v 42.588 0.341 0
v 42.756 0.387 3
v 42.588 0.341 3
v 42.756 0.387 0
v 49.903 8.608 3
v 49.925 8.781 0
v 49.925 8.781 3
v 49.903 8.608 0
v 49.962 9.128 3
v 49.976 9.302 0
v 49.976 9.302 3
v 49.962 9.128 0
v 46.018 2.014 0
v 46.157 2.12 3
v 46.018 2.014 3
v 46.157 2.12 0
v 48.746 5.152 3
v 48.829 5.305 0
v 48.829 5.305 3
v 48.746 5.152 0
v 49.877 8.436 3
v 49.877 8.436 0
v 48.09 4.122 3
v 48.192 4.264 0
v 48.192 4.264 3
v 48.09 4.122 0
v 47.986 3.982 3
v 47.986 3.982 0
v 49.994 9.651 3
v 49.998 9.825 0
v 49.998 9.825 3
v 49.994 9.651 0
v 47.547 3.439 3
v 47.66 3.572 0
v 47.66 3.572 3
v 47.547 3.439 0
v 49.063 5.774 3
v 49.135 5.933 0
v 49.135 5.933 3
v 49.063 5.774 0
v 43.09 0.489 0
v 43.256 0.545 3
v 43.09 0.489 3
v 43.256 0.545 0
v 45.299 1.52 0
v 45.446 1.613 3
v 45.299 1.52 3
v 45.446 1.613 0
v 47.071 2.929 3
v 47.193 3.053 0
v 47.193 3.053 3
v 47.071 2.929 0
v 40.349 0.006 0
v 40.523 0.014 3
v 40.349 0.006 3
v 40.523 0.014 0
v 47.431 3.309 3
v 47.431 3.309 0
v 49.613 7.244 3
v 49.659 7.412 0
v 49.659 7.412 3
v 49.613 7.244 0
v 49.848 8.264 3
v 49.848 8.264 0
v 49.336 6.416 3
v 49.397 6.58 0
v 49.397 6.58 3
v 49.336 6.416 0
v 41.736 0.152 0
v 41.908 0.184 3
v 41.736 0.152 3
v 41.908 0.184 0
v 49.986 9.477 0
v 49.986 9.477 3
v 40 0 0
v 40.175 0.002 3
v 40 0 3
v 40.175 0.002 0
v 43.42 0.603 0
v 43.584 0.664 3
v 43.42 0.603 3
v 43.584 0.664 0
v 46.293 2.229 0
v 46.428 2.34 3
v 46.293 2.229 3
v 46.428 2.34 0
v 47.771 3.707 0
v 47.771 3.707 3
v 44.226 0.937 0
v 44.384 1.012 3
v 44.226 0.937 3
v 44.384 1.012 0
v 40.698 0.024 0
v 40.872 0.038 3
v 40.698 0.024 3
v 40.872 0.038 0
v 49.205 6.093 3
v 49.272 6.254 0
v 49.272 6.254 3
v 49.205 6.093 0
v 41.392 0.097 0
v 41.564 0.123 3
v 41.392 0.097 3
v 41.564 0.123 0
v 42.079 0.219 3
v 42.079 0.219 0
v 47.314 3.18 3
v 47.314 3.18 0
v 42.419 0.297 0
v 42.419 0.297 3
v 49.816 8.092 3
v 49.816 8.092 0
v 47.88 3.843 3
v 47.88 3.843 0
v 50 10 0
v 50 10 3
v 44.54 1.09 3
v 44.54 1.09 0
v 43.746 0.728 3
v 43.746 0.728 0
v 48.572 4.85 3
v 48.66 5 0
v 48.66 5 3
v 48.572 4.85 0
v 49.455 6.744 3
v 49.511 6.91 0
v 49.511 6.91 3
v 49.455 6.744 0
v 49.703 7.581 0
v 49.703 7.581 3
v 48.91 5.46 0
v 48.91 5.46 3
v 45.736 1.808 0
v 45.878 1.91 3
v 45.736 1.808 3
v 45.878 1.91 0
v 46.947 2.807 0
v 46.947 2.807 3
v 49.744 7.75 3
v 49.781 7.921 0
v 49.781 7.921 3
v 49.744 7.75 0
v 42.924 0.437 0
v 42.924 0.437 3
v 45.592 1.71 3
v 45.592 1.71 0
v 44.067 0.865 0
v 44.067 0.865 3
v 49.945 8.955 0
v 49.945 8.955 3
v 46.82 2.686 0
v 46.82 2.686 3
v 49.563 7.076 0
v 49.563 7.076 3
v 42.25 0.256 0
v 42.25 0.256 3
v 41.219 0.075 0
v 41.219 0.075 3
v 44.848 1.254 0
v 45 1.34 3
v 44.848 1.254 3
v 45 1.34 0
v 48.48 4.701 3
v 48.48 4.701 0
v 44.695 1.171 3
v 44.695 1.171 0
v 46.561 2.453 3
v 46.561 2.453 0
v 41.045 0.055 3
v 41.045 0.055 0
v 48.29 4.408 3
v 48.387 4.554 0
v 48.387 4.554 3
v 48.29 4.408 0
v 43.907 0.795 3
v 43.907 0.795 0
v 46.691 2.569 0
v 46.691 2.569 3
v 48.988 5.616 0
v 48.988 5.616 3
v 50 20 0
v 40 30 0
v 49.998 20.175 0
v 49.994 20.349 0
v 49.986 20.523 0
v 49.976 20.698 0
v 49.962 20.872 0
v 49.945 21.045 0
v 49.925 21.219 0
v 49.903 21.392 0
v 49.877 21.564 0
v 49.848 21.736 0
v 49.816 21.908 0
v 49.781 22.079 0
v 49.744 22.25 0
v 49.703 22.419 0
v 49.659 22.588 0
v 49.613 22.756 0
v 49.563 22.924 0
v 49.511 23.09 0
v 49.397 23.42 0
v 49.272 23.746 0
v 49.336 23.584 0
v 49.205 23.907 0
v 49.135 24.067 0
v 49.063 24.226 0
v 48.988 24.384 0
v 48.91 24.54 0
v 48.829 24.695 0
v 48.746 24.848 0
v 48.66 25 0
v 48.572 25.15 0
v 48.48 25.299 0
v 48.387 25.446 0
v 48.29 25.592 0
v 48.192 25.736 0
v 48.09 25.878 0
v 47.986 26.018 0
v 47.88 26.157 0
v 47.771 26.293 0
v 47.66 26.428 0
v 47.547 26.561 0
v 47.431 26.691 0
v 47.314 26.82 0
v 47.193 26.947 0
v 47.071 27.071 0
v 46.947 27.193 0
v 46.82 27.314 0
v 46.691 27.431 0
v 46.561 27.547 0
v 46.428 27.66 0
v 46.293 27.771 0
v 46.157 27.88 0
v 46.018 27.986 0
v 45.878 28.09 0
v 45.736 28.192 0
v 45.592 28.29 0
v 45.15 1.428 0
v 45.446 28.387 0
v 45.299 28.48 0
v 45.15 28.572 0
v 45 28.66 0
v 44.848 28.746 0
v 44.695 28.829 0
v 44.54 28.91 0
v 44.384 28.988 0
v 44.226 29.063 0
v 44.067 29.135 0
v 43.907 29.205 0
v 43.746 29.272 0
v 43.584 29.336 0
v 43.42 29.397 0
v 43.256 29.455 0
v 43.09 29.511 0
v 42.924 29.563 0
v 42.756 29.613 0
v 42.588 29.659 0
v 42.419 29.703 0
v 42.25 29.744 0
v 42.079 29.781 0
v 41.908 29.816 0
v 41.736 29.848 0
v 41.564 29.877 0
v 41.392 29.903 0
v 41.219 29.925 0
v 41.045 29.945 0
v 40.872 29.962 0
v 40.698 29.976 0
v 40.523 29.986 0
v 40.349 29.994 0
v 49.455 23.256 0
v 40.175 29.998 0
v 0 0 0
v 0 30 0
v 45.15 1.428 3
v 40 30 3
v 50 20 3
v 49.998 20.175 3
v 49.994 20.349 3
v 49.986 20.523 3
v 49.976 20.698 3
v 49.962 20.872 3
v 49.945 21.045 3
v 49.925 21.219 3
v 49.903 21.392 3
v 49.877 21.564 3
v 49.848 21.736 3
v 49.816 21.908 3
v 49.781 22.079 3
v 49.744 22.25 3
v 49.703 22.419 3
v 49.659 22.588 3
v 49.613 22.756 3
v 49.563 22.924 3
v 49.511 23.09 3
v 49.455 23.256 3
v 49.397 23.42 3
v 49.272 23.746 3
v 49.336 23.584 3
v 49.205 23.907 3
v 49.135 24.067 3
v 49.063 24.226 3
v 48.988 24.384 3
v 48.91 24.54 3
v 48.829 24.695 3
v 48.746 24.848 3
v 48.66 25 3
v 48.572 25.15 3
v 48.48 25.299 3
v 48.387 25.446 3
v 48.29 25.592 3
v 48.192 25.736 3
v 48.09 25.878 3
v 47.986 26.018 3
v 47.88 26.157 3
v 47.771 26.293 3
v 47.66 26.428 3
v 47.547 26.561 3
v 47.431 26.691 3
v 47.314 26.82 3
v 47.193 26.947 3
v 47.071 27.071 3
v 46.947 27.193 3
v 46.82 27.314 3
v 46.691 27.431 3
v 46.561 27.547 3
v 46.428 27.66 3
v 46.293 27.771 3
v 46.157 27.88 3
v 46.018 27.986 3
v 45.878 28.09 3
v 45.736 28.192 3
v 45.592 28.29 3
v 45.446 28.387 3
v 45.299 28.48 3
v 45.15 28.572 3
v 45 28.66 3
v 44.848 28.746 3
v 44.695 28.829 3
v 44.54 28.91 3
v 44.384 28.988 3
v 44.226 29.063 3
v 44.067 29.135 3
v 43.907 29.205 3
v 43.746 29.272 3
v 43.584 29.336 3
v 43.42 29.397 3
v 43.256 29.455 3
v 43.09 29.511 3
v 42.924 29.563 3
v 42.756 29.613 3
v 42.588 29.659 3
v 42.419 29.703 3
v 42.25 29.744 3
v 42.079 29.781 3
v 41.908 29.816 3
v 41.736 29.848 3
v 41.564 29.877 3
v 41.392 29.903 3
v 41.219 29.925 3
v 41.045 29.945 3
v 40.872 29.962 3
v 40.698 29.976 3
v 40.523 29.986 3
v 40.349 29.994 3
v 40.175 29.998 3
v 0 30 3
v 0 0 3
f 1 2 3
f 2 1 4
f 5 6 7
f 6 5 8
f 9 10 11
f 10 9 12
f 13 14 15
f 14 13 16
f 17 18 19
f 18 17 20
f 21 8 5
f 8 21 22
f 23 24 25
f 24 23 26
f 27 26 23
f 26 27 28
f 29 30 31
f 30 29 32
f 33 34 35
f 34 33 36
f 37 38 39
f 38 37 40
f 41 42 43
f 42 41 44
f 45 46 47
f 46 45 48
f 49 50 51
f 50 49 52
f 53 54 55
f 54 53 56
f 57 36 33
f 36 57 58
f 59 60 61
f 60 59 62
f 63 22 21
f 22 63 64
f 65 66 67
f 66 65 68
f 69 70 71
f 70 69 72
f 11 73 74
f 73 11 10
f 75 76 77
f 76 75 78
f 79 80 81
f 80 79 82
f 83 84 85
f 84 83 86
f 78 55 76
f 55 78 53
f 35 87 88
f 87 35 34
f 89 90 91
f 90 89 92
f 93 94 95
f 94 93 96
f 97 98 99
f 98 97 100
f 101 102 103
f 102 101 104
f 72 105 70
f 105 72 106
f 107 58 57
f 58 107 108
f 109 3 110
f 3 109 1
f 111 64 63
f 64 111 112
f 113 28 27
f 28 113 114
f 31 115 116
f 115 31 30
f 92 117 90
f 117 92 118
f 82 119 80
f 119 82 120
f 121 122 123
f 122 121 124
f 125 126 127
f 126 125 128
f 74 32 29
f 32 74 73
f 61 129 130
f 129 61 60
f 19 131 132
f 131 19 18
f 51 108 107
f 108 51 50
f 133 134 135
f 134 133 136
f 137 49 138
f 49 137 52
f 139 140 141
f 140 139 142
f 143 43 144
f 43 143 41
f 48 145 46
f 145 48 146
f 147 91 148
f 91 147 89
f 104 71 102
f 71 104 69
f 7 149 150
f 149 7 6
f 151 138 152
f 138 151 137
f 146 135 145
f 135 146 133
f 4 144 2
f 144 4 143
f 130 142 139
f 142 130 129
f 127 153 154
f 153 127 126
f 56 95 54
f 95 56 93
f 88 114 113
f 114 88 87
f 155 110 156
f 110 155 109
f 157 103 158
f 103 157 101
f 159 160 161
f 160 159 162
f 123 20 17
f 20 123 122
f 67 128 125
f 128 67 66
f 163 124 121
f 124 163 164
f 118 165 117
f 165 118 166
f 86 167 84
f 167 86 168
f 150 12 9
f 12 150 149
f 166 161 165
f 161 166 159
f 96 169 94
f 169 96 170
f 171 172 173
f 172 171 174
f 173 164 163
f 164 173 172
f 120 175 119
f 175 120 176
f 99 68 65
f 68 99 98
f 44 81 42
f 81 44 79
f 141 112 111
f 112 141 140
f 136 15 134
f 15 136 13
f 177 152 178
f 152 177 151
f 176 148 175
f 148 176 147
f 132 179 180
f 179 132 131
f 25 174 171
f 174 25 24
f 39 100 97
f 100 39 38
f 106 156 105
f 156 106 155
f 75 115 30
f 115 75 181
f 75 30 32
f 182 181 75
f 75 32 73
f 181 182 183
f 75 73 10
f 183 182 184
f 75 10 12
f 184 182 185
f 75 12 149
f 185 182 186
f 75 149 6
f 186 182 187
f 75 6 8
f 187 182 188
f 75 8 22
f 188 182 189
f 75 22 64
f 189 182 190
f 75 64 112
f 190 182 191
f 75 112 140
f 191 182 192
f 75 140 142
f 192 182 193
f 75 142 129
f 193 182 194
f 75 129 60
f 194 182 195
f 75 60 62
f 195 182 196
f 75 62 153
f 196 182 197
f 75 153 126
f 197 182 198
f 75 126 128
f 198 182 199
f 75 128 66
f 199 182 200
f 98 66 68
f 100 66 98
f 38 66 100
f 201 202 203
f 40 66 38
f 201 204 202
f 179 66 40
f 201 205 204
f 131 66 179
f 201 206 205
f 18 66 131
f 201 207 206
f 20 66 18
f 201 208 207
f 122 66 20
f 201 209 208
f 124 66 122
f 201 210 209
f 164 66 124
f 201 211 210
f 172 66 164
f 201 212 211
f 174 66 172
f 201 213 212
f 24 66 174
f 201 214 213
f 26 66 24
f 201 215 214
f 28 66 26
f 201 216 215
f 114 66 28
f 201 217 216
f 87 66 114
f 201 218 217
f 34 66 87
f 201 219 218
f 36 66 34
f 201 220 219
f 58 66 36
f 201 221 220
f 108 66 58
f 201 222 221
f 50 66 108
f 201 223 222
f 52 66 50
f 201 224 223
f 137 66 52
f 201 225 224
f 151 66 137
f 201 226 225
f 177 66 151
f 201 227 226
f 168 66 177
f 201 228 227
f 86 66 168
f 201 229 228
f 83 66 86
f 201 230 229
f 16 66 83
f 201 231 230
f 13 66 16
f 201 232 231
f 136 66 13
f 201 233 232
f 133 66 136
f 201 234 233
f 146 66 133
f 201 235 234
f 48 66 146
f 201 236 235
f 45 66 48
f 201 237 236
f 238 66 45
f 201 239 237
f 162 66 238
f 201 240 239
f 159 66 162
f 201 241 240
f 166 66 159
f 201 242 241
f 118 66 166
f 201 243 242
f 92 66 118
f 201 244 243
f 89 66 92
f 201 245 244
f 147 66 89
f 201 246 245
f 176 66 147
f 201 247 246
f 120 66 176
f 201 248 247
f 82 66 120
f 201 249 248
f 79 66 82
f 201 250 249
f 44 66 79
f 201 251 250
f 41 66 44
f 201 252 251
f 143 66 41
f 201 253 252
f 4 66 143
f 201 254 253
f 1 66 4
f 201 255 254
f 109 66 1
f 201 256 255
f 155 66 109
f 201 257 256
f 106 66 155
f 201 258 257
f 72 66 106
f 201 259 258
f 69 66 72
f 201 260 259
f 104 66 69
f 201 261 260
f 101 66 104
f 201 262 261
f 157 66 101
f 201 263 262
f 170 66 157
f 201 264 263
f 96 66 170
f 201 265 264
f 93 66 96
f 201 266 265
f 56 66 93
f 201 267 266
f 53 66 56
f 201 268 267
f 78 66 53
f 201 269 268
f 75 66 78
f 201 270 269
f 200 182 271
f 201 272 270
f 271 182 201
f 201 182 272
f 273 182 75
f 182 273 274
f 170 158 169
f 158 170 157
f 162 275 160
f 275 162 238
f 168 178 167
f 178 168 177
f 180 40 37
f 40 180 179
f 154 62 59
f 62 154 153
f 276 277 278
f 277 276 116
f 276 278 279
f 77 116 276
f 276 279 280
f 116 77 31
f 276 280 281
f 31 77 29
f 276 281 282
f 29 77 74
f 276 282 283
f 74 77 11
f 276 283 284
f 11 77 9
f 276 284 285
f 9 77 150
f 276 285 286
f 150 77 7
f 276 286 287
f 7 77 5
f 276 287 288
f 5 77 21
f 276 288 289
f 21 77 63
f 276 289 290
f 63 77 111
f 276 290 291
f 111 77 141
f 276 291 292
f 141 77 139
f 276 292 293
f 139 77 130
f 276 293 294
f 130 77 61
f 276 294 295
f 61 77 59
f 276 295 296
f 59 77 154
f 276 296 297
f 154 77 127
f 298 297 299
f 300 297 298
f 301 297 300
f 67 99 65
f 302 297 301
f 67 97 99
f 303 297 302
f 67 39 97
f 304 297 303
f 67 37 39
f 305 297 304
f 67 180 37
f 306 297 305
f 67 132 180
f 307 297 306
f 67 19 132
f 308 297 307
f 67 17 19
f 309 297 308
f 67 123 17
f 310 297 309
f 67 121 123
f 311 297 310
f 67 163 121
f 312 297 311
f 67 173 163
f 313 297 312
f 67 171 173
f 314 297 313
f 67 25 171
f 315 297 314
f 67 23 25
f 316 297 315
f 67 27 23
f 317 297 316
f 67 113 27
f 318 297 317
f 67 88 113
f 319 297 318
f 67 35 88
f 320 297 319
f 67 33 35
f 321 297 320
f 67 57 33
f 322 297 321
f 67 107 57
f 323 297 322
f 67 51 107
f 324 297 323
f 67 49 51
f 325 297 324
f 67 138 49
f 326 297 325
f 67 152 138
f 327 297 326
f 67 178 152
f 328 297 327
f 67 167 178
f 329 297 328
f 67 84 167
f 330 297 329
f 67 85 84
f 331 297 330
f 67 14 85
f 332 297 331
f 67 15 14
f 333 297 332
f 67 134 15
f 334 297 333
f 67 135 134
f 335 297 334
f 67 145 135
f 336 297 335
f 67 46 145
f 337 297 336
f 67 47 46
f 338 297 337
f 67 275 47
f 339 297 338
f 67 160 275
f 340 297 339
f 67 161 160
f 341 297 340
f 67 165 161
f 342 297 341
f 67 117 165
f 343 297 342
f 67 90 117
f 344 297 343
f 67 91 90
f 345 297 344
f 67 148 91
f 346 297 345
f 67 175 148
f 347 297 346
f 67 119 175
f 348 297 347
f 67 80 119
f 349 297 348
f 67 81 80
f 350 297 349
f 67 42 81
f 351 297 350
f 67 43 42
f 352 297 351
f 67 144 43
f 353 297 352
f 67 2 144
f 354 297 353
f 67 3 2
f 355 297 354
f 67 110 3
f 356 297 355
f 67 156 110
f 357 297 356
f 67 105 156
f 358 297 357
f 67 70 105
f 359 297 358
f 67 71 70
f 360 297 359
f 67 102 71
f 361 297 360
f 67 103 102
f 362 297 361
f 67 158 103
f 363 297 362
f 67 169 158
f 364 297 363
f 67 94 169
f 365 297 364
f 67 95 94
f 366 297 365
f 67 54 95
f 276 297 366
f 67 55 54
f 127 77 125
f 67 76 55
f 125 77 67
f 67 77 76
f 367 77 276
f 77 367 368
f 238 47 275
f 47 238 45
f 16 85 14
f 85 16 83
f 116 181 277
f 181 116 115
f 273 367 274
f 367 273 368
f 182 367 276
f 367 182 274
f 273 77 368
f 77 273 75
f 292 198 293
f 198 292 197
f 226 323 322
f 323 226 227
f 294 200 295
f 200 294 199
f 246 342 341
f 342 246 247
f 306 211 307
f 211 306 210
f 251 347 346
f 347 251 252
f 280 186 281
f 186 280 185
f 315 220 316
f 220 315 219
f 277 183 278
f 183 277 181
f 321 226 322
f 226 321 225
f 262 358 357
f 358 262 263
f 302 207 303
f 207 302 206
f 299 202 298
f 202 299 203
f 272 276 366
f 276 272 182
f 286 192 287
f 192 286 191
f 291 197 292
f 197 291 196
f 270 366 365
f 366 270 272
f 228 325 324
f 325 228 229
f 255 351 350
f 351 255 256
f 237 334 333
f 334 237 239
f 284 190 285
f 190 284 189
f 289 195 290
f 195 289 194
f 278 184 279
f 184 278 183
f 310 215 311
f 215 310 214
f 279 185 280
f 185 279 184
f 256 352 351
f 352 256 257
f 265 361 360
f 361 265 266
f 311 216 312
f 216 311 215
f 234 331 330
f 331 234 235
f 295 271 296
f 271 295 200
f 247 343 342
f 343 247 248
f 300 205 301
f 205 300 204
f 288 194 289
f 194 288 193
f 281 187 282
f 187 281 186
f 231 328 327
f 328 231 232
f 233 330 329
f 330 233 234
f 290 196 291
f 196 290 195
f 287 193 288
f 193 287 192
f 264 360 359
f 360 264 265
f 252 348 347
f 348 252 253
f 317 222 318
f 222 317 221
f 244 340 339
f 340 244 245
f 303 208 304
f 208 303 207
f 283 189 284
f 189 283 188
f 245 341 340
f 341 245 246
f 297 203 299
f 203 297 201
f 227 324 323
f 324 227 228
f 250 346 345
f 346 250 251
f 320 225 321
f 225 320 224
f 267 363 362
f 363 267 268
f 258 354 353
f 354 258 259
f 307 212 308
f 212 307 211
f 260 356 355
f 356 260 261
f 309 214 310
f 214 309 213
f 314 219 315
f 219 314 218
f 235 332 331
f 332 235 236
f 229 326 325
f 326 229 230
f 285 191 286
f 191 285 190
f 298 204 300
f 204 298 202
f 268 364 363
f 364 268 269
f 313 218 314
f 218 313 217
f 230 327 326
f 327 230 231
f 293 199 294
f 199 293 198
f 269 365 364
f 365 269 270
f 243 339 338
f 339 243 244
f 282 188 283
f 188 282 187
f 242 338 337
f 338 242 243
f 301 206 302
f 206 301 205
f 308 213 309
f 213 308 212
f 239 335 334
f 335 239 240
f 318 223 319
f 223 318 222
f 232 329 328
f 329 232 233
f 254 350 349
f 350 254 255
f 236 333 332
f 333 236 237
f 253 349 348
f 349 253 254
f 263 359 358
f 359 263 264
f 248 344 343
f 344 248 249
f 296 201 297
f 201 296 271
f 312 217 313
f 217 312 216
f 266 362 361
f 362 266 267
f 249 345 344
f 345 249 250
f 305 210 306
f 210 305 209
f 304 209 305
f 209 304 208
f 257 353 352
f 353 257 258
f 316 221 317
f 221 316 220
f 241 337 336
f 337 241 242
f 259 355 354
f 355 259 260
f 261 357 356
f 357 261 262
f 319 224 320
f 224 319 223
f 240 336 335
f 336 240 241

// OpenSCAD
/*
 * Cubes with rounded corners
 */
 
 // Examples
$fn = 360;
rounded_cube1(lx=50, ly=30, lz=3, r=10);


// Rounded corners on 1 side (x "end") of the cube:
module rounded_cube1(lx, ly, lz, r, center=false, mirror=false)
{
    assert(2*r <= ly);
    // Offsets if we should center the module:
    _tcx = center ? -lx/2 : 0;
    _tcy = center ? -ly/2 : 0;
    _tcz = center ? -lz/2 : 0;
        
    translate([_tcx, _tcy, _tcz])
    union()
    {
        _tmx1 = mirror ? r : 0;
        translate([_tmx1, 0, 0])
        cube([lx-r, ly, lz]);
        
        _tmx2 = mirror ? r : lx-r;
        translate([_tmx2, ly-r, 0])
        cylinder(h=lz, r=r);
        
        if (2*r < ly)
        {
            translate([_tmx2, r, 0])
            cylinder(h=lz, r=r);
            
            color("green")
            translate([0, r, 0])
            cube([lx, ly-2*r, lz]);
        }
    }
}
